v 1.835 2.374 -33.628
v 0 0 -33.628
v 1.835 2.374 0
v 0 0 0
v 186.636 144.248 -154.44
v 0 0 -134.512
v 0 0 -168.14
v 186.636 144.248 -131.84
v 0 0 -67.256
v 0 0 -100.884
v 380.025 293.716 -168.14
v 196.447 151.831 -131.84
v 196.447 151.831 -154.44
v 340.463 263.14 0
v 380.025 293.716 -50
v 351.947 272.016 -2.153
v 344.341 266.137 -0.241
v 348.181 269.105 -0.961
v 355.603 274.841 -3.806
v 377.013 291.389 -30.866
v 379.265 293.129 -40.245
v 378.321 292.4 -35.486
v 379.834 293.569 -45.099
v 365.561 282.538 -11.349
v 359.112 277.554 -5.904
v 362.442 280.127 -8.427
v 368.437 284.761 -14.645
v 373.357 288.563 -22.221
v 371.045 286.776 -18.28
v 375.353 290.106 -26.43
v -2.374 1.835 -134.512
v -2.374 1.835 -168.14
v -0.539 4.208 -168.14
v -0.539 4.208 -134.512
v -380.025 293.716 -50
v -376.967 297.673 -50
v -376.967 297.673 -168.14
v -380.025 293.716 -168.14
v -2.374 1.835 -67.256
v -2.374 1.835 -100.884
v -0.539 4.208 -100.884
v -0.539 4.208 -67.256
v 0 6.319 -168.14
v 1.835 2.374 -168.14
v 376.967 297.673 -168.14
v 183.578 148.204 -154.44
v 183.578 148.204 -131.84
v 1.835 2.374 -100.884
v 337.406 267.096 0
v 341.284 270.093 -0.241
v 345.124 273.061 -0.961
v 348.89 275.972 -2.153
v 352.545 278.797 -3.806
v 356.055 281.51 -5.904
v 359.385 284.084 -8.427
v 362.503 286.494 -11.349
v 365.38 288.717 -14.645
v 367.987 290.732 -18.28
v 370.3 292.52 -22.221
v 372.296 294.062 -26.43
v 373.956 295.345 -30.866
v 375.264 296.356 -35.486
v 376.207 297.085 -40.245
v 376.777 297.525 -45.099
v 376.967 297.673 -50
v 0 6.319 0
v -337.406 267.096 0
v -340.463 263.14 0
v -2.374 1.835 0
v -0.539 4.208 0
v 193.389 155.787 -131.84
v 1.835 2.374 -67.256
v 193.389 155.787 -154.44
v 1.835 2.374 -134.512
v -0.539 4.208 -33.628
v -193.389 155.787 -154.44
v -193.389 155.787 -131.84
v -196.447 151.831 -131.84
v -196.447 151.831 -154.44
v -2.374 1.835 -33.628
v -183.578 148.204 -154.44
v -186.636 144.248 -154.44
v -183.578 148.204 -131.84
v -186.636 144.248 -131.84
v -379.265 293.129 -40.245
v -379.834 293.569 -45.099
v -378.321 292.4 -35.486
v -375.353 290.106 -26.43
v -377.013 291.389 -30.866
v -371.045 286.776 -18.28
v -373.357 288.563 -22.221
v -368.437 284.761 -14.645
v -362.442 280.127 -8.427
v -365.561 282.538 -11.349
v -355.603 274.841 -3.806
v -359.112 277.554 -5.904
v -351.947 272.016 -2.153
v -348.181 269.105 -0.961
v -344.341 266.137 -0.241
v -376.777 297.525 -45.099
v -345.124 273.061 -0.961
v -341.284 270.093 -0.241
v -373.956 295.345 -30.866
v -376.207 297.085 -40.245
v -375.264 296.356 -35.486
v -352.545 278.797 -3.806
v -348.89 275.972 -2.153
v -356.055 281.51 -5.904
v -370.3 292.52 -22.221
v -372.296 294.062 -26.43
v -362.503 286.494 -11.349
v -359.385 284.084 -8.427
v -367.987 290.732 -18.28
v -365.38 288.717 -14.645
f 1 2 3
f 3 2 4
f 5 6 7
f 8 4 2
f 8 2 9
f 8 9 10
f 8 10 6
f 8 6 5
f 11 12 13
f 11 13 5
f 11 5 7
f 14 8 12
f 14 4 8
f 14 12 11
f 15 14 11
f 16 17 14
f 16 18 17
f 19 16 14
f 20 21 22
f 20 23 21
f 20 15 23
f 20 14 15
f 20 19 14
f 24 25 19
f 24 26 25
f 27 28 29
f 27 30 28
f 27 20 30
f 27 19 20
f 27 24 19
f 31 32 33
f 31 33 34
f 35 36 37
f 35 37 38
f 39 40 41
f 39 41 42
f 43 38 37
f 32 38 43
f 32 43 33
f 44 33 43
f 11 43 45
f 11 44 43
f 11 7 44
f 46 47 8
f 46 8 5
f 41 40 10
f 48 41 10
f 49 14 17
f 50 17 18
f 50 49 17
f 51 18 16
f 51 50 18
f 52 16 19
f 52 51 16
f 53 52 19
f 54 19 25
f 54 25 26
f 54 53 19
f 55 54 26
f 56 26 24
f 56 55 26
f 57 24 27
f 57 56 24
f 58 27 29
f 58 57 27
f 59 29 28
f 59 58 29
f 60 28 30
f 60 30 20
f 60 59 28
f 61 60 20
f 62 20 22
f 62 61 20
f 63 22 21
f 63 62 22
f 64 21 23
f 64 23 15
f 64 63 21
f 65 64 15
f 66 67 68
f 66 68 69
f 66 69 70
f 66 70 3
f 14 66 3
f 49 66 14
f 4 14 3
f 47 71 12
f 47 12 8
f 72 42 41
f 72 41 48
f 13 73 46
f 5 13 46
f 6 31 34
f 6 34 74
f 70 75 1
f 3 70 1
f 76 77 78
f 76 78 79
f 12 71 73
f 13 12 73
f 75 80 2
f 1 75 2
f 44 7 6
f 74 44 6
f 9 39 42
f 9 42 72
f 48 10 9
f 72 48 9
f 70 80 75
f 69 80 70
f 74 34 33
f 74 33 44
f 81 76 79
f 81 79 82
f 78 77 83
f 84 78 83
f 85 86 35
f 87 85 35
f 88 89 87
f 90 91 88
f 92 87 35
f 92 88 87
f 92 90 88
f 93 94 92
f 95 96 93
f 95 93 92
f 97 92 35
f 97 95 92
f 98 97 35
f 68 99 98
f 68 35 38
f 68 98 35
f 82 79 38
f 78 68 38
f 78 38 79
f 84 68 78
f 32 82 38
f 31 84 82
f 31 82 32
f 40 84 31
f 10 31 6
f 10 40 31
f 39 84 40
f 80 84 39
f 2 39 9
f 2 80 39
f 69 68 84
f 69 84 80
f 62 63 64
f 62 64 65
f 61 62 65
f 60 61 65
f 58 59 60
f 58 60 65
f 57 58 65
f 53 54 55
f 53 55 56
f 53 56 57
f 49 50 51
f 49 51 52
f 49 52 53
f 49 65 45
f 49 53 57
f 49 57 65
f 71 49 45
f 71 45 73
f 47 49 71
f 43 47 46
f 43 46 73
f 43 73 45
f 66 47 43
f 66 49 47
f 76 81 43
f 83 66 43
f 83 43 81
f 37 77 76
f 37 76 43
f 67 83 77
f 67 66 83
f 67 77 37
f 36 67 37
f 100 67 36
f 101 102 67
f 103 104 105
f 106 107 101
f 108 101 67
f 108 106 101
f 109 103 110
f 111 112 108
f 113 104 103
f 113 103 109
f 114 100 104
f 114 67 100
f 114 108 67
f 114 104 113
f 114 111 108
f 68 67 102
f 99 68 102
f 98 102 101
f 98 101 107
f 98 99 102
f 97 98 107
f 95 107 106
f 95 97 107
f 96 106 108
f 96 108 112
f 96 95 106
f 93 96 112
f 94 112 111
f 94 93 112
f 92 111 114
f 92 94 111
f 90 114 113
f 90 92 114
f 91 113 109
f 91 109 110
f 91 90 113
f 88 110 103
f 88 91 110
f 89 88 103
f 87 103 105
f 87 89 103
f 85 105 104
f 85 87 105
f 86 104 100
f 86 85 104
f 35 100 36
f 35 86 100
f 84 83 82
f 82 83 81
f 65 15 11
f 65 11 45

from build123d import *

# Parameters (mm, degrees)
BOSS_EXTRUDE1_DEPTH     = 240.2
CUT_EXTRUDE3_DEPTH      = 540.188032545
CUT_EXTRUDE3_DEPTH_BACK = 540.188032545
SKETCH2_W               = 760.049325768
SKETCH2_H               = 72.06
SKETCH3_W               = 12.4
SKETCH3_H               = 22.6
CUT_EXTRUDE4_DEPTH      = 512.167734023
FILLET1_R               = 50
SKETCH5_W               = 3
SKETCH5_H               = 33.628
CUT_EXTRUDE6_DEPTH      = 3


with BuildPart() as part:
    # Sketch1 → Boss-Extrude1 (new body)
    with BuildSketch(Plane.XY):
        Polygon((0, 0), (380.024662884, 293.716437401), (376.967027683, 297.672555066), (0, 6.319326703), (-376.967027683, 297.672555066), (-380.024662884, 293.716437401), align=None)
    extrude(amount=-BOSS_EXTRUDE1_DEPTH)

    # Sketch2 → Cut-Extrude3 (cut, two sides: drawn at the far end of the back side and taken through both)
    with BuildSketch(Plane(origin=(0, 0, 0), x_dir=(1, 0, 0), z_dir=(0, 1, 0)).offset(-CUT_EXTRUDE3_DEPTH_BACK)):
        with Locations((0, 204.17)):
            Rectangle(SKETCH2_W, SKETCH2_H)
    extrude(amount=CUT_EXTRUDE3_DEPTH + CUT_EXTRUDE3_DEPTH_BACK, mode=Mode.SUBTRACT)

    # Sketch3 → Cut-Extrude4 (cut, symmetric)
    with BuildSketch(Plane(origin=(3.057635201, 3.956117665, 0), x_dir=(0.7912235329674936, -0.6115270401858268, 0), z_dir=(0.6115270401858268, 0.7912235329674936, 0))):
        with Locations((-242.082219577, 143.14)):
            Rectangle(SKETCH3_W, SKETCH3_H)
    cut_extrude4 = extrude(amount=CUT_EXTRUDE4_DEPTH, both=True, mode=Mode.SUBTRACT)

    # Mirror1: Cut-Extrude4 across plane
    add(cut_extrude4.mirror(Plane(origin=(0, 0, 0), x_dir=(0, 0, 1), z_dir=(1, 0, 0))), mode=Mode.SUBTRACT)

    # Fillet1
    fillet1_edges = [part.edges().sort_by_distance(p)[0] for p in [
        (-378.495845284, 295.694496234, 0),
        (378.495845284, 295.694496234, 0),
    ]]
    fillet(fillet1_edges, radius=FILLET1_R)

    # Sketch5 → Cut-Extrude6 (cut)
    with BuildSketch(Plane(origin=(0, 0, 0), x_dir=(0.7912235329674936, -0.6115270401858267, 0), z_dir=(-0.6115270401858267, -0.7912235329674936, 0))):
        with Locations((-1.5, -16.814)):
            Rectangle(SKETCH5_W, SKETCH5_H)
        with Locations((-1.5, -84.07)):
            Rectangle(SKETCH5_W, SKETCH5_H)
        with Locations((-1.5, -151.326)):
            Rectangle(SKETCH5_W, SKETCH5_H)
    extrude(amount=-CUT_EXTRUDE6_DEPTH, mode=Mode.SUBTRACT)


solid = part.part
